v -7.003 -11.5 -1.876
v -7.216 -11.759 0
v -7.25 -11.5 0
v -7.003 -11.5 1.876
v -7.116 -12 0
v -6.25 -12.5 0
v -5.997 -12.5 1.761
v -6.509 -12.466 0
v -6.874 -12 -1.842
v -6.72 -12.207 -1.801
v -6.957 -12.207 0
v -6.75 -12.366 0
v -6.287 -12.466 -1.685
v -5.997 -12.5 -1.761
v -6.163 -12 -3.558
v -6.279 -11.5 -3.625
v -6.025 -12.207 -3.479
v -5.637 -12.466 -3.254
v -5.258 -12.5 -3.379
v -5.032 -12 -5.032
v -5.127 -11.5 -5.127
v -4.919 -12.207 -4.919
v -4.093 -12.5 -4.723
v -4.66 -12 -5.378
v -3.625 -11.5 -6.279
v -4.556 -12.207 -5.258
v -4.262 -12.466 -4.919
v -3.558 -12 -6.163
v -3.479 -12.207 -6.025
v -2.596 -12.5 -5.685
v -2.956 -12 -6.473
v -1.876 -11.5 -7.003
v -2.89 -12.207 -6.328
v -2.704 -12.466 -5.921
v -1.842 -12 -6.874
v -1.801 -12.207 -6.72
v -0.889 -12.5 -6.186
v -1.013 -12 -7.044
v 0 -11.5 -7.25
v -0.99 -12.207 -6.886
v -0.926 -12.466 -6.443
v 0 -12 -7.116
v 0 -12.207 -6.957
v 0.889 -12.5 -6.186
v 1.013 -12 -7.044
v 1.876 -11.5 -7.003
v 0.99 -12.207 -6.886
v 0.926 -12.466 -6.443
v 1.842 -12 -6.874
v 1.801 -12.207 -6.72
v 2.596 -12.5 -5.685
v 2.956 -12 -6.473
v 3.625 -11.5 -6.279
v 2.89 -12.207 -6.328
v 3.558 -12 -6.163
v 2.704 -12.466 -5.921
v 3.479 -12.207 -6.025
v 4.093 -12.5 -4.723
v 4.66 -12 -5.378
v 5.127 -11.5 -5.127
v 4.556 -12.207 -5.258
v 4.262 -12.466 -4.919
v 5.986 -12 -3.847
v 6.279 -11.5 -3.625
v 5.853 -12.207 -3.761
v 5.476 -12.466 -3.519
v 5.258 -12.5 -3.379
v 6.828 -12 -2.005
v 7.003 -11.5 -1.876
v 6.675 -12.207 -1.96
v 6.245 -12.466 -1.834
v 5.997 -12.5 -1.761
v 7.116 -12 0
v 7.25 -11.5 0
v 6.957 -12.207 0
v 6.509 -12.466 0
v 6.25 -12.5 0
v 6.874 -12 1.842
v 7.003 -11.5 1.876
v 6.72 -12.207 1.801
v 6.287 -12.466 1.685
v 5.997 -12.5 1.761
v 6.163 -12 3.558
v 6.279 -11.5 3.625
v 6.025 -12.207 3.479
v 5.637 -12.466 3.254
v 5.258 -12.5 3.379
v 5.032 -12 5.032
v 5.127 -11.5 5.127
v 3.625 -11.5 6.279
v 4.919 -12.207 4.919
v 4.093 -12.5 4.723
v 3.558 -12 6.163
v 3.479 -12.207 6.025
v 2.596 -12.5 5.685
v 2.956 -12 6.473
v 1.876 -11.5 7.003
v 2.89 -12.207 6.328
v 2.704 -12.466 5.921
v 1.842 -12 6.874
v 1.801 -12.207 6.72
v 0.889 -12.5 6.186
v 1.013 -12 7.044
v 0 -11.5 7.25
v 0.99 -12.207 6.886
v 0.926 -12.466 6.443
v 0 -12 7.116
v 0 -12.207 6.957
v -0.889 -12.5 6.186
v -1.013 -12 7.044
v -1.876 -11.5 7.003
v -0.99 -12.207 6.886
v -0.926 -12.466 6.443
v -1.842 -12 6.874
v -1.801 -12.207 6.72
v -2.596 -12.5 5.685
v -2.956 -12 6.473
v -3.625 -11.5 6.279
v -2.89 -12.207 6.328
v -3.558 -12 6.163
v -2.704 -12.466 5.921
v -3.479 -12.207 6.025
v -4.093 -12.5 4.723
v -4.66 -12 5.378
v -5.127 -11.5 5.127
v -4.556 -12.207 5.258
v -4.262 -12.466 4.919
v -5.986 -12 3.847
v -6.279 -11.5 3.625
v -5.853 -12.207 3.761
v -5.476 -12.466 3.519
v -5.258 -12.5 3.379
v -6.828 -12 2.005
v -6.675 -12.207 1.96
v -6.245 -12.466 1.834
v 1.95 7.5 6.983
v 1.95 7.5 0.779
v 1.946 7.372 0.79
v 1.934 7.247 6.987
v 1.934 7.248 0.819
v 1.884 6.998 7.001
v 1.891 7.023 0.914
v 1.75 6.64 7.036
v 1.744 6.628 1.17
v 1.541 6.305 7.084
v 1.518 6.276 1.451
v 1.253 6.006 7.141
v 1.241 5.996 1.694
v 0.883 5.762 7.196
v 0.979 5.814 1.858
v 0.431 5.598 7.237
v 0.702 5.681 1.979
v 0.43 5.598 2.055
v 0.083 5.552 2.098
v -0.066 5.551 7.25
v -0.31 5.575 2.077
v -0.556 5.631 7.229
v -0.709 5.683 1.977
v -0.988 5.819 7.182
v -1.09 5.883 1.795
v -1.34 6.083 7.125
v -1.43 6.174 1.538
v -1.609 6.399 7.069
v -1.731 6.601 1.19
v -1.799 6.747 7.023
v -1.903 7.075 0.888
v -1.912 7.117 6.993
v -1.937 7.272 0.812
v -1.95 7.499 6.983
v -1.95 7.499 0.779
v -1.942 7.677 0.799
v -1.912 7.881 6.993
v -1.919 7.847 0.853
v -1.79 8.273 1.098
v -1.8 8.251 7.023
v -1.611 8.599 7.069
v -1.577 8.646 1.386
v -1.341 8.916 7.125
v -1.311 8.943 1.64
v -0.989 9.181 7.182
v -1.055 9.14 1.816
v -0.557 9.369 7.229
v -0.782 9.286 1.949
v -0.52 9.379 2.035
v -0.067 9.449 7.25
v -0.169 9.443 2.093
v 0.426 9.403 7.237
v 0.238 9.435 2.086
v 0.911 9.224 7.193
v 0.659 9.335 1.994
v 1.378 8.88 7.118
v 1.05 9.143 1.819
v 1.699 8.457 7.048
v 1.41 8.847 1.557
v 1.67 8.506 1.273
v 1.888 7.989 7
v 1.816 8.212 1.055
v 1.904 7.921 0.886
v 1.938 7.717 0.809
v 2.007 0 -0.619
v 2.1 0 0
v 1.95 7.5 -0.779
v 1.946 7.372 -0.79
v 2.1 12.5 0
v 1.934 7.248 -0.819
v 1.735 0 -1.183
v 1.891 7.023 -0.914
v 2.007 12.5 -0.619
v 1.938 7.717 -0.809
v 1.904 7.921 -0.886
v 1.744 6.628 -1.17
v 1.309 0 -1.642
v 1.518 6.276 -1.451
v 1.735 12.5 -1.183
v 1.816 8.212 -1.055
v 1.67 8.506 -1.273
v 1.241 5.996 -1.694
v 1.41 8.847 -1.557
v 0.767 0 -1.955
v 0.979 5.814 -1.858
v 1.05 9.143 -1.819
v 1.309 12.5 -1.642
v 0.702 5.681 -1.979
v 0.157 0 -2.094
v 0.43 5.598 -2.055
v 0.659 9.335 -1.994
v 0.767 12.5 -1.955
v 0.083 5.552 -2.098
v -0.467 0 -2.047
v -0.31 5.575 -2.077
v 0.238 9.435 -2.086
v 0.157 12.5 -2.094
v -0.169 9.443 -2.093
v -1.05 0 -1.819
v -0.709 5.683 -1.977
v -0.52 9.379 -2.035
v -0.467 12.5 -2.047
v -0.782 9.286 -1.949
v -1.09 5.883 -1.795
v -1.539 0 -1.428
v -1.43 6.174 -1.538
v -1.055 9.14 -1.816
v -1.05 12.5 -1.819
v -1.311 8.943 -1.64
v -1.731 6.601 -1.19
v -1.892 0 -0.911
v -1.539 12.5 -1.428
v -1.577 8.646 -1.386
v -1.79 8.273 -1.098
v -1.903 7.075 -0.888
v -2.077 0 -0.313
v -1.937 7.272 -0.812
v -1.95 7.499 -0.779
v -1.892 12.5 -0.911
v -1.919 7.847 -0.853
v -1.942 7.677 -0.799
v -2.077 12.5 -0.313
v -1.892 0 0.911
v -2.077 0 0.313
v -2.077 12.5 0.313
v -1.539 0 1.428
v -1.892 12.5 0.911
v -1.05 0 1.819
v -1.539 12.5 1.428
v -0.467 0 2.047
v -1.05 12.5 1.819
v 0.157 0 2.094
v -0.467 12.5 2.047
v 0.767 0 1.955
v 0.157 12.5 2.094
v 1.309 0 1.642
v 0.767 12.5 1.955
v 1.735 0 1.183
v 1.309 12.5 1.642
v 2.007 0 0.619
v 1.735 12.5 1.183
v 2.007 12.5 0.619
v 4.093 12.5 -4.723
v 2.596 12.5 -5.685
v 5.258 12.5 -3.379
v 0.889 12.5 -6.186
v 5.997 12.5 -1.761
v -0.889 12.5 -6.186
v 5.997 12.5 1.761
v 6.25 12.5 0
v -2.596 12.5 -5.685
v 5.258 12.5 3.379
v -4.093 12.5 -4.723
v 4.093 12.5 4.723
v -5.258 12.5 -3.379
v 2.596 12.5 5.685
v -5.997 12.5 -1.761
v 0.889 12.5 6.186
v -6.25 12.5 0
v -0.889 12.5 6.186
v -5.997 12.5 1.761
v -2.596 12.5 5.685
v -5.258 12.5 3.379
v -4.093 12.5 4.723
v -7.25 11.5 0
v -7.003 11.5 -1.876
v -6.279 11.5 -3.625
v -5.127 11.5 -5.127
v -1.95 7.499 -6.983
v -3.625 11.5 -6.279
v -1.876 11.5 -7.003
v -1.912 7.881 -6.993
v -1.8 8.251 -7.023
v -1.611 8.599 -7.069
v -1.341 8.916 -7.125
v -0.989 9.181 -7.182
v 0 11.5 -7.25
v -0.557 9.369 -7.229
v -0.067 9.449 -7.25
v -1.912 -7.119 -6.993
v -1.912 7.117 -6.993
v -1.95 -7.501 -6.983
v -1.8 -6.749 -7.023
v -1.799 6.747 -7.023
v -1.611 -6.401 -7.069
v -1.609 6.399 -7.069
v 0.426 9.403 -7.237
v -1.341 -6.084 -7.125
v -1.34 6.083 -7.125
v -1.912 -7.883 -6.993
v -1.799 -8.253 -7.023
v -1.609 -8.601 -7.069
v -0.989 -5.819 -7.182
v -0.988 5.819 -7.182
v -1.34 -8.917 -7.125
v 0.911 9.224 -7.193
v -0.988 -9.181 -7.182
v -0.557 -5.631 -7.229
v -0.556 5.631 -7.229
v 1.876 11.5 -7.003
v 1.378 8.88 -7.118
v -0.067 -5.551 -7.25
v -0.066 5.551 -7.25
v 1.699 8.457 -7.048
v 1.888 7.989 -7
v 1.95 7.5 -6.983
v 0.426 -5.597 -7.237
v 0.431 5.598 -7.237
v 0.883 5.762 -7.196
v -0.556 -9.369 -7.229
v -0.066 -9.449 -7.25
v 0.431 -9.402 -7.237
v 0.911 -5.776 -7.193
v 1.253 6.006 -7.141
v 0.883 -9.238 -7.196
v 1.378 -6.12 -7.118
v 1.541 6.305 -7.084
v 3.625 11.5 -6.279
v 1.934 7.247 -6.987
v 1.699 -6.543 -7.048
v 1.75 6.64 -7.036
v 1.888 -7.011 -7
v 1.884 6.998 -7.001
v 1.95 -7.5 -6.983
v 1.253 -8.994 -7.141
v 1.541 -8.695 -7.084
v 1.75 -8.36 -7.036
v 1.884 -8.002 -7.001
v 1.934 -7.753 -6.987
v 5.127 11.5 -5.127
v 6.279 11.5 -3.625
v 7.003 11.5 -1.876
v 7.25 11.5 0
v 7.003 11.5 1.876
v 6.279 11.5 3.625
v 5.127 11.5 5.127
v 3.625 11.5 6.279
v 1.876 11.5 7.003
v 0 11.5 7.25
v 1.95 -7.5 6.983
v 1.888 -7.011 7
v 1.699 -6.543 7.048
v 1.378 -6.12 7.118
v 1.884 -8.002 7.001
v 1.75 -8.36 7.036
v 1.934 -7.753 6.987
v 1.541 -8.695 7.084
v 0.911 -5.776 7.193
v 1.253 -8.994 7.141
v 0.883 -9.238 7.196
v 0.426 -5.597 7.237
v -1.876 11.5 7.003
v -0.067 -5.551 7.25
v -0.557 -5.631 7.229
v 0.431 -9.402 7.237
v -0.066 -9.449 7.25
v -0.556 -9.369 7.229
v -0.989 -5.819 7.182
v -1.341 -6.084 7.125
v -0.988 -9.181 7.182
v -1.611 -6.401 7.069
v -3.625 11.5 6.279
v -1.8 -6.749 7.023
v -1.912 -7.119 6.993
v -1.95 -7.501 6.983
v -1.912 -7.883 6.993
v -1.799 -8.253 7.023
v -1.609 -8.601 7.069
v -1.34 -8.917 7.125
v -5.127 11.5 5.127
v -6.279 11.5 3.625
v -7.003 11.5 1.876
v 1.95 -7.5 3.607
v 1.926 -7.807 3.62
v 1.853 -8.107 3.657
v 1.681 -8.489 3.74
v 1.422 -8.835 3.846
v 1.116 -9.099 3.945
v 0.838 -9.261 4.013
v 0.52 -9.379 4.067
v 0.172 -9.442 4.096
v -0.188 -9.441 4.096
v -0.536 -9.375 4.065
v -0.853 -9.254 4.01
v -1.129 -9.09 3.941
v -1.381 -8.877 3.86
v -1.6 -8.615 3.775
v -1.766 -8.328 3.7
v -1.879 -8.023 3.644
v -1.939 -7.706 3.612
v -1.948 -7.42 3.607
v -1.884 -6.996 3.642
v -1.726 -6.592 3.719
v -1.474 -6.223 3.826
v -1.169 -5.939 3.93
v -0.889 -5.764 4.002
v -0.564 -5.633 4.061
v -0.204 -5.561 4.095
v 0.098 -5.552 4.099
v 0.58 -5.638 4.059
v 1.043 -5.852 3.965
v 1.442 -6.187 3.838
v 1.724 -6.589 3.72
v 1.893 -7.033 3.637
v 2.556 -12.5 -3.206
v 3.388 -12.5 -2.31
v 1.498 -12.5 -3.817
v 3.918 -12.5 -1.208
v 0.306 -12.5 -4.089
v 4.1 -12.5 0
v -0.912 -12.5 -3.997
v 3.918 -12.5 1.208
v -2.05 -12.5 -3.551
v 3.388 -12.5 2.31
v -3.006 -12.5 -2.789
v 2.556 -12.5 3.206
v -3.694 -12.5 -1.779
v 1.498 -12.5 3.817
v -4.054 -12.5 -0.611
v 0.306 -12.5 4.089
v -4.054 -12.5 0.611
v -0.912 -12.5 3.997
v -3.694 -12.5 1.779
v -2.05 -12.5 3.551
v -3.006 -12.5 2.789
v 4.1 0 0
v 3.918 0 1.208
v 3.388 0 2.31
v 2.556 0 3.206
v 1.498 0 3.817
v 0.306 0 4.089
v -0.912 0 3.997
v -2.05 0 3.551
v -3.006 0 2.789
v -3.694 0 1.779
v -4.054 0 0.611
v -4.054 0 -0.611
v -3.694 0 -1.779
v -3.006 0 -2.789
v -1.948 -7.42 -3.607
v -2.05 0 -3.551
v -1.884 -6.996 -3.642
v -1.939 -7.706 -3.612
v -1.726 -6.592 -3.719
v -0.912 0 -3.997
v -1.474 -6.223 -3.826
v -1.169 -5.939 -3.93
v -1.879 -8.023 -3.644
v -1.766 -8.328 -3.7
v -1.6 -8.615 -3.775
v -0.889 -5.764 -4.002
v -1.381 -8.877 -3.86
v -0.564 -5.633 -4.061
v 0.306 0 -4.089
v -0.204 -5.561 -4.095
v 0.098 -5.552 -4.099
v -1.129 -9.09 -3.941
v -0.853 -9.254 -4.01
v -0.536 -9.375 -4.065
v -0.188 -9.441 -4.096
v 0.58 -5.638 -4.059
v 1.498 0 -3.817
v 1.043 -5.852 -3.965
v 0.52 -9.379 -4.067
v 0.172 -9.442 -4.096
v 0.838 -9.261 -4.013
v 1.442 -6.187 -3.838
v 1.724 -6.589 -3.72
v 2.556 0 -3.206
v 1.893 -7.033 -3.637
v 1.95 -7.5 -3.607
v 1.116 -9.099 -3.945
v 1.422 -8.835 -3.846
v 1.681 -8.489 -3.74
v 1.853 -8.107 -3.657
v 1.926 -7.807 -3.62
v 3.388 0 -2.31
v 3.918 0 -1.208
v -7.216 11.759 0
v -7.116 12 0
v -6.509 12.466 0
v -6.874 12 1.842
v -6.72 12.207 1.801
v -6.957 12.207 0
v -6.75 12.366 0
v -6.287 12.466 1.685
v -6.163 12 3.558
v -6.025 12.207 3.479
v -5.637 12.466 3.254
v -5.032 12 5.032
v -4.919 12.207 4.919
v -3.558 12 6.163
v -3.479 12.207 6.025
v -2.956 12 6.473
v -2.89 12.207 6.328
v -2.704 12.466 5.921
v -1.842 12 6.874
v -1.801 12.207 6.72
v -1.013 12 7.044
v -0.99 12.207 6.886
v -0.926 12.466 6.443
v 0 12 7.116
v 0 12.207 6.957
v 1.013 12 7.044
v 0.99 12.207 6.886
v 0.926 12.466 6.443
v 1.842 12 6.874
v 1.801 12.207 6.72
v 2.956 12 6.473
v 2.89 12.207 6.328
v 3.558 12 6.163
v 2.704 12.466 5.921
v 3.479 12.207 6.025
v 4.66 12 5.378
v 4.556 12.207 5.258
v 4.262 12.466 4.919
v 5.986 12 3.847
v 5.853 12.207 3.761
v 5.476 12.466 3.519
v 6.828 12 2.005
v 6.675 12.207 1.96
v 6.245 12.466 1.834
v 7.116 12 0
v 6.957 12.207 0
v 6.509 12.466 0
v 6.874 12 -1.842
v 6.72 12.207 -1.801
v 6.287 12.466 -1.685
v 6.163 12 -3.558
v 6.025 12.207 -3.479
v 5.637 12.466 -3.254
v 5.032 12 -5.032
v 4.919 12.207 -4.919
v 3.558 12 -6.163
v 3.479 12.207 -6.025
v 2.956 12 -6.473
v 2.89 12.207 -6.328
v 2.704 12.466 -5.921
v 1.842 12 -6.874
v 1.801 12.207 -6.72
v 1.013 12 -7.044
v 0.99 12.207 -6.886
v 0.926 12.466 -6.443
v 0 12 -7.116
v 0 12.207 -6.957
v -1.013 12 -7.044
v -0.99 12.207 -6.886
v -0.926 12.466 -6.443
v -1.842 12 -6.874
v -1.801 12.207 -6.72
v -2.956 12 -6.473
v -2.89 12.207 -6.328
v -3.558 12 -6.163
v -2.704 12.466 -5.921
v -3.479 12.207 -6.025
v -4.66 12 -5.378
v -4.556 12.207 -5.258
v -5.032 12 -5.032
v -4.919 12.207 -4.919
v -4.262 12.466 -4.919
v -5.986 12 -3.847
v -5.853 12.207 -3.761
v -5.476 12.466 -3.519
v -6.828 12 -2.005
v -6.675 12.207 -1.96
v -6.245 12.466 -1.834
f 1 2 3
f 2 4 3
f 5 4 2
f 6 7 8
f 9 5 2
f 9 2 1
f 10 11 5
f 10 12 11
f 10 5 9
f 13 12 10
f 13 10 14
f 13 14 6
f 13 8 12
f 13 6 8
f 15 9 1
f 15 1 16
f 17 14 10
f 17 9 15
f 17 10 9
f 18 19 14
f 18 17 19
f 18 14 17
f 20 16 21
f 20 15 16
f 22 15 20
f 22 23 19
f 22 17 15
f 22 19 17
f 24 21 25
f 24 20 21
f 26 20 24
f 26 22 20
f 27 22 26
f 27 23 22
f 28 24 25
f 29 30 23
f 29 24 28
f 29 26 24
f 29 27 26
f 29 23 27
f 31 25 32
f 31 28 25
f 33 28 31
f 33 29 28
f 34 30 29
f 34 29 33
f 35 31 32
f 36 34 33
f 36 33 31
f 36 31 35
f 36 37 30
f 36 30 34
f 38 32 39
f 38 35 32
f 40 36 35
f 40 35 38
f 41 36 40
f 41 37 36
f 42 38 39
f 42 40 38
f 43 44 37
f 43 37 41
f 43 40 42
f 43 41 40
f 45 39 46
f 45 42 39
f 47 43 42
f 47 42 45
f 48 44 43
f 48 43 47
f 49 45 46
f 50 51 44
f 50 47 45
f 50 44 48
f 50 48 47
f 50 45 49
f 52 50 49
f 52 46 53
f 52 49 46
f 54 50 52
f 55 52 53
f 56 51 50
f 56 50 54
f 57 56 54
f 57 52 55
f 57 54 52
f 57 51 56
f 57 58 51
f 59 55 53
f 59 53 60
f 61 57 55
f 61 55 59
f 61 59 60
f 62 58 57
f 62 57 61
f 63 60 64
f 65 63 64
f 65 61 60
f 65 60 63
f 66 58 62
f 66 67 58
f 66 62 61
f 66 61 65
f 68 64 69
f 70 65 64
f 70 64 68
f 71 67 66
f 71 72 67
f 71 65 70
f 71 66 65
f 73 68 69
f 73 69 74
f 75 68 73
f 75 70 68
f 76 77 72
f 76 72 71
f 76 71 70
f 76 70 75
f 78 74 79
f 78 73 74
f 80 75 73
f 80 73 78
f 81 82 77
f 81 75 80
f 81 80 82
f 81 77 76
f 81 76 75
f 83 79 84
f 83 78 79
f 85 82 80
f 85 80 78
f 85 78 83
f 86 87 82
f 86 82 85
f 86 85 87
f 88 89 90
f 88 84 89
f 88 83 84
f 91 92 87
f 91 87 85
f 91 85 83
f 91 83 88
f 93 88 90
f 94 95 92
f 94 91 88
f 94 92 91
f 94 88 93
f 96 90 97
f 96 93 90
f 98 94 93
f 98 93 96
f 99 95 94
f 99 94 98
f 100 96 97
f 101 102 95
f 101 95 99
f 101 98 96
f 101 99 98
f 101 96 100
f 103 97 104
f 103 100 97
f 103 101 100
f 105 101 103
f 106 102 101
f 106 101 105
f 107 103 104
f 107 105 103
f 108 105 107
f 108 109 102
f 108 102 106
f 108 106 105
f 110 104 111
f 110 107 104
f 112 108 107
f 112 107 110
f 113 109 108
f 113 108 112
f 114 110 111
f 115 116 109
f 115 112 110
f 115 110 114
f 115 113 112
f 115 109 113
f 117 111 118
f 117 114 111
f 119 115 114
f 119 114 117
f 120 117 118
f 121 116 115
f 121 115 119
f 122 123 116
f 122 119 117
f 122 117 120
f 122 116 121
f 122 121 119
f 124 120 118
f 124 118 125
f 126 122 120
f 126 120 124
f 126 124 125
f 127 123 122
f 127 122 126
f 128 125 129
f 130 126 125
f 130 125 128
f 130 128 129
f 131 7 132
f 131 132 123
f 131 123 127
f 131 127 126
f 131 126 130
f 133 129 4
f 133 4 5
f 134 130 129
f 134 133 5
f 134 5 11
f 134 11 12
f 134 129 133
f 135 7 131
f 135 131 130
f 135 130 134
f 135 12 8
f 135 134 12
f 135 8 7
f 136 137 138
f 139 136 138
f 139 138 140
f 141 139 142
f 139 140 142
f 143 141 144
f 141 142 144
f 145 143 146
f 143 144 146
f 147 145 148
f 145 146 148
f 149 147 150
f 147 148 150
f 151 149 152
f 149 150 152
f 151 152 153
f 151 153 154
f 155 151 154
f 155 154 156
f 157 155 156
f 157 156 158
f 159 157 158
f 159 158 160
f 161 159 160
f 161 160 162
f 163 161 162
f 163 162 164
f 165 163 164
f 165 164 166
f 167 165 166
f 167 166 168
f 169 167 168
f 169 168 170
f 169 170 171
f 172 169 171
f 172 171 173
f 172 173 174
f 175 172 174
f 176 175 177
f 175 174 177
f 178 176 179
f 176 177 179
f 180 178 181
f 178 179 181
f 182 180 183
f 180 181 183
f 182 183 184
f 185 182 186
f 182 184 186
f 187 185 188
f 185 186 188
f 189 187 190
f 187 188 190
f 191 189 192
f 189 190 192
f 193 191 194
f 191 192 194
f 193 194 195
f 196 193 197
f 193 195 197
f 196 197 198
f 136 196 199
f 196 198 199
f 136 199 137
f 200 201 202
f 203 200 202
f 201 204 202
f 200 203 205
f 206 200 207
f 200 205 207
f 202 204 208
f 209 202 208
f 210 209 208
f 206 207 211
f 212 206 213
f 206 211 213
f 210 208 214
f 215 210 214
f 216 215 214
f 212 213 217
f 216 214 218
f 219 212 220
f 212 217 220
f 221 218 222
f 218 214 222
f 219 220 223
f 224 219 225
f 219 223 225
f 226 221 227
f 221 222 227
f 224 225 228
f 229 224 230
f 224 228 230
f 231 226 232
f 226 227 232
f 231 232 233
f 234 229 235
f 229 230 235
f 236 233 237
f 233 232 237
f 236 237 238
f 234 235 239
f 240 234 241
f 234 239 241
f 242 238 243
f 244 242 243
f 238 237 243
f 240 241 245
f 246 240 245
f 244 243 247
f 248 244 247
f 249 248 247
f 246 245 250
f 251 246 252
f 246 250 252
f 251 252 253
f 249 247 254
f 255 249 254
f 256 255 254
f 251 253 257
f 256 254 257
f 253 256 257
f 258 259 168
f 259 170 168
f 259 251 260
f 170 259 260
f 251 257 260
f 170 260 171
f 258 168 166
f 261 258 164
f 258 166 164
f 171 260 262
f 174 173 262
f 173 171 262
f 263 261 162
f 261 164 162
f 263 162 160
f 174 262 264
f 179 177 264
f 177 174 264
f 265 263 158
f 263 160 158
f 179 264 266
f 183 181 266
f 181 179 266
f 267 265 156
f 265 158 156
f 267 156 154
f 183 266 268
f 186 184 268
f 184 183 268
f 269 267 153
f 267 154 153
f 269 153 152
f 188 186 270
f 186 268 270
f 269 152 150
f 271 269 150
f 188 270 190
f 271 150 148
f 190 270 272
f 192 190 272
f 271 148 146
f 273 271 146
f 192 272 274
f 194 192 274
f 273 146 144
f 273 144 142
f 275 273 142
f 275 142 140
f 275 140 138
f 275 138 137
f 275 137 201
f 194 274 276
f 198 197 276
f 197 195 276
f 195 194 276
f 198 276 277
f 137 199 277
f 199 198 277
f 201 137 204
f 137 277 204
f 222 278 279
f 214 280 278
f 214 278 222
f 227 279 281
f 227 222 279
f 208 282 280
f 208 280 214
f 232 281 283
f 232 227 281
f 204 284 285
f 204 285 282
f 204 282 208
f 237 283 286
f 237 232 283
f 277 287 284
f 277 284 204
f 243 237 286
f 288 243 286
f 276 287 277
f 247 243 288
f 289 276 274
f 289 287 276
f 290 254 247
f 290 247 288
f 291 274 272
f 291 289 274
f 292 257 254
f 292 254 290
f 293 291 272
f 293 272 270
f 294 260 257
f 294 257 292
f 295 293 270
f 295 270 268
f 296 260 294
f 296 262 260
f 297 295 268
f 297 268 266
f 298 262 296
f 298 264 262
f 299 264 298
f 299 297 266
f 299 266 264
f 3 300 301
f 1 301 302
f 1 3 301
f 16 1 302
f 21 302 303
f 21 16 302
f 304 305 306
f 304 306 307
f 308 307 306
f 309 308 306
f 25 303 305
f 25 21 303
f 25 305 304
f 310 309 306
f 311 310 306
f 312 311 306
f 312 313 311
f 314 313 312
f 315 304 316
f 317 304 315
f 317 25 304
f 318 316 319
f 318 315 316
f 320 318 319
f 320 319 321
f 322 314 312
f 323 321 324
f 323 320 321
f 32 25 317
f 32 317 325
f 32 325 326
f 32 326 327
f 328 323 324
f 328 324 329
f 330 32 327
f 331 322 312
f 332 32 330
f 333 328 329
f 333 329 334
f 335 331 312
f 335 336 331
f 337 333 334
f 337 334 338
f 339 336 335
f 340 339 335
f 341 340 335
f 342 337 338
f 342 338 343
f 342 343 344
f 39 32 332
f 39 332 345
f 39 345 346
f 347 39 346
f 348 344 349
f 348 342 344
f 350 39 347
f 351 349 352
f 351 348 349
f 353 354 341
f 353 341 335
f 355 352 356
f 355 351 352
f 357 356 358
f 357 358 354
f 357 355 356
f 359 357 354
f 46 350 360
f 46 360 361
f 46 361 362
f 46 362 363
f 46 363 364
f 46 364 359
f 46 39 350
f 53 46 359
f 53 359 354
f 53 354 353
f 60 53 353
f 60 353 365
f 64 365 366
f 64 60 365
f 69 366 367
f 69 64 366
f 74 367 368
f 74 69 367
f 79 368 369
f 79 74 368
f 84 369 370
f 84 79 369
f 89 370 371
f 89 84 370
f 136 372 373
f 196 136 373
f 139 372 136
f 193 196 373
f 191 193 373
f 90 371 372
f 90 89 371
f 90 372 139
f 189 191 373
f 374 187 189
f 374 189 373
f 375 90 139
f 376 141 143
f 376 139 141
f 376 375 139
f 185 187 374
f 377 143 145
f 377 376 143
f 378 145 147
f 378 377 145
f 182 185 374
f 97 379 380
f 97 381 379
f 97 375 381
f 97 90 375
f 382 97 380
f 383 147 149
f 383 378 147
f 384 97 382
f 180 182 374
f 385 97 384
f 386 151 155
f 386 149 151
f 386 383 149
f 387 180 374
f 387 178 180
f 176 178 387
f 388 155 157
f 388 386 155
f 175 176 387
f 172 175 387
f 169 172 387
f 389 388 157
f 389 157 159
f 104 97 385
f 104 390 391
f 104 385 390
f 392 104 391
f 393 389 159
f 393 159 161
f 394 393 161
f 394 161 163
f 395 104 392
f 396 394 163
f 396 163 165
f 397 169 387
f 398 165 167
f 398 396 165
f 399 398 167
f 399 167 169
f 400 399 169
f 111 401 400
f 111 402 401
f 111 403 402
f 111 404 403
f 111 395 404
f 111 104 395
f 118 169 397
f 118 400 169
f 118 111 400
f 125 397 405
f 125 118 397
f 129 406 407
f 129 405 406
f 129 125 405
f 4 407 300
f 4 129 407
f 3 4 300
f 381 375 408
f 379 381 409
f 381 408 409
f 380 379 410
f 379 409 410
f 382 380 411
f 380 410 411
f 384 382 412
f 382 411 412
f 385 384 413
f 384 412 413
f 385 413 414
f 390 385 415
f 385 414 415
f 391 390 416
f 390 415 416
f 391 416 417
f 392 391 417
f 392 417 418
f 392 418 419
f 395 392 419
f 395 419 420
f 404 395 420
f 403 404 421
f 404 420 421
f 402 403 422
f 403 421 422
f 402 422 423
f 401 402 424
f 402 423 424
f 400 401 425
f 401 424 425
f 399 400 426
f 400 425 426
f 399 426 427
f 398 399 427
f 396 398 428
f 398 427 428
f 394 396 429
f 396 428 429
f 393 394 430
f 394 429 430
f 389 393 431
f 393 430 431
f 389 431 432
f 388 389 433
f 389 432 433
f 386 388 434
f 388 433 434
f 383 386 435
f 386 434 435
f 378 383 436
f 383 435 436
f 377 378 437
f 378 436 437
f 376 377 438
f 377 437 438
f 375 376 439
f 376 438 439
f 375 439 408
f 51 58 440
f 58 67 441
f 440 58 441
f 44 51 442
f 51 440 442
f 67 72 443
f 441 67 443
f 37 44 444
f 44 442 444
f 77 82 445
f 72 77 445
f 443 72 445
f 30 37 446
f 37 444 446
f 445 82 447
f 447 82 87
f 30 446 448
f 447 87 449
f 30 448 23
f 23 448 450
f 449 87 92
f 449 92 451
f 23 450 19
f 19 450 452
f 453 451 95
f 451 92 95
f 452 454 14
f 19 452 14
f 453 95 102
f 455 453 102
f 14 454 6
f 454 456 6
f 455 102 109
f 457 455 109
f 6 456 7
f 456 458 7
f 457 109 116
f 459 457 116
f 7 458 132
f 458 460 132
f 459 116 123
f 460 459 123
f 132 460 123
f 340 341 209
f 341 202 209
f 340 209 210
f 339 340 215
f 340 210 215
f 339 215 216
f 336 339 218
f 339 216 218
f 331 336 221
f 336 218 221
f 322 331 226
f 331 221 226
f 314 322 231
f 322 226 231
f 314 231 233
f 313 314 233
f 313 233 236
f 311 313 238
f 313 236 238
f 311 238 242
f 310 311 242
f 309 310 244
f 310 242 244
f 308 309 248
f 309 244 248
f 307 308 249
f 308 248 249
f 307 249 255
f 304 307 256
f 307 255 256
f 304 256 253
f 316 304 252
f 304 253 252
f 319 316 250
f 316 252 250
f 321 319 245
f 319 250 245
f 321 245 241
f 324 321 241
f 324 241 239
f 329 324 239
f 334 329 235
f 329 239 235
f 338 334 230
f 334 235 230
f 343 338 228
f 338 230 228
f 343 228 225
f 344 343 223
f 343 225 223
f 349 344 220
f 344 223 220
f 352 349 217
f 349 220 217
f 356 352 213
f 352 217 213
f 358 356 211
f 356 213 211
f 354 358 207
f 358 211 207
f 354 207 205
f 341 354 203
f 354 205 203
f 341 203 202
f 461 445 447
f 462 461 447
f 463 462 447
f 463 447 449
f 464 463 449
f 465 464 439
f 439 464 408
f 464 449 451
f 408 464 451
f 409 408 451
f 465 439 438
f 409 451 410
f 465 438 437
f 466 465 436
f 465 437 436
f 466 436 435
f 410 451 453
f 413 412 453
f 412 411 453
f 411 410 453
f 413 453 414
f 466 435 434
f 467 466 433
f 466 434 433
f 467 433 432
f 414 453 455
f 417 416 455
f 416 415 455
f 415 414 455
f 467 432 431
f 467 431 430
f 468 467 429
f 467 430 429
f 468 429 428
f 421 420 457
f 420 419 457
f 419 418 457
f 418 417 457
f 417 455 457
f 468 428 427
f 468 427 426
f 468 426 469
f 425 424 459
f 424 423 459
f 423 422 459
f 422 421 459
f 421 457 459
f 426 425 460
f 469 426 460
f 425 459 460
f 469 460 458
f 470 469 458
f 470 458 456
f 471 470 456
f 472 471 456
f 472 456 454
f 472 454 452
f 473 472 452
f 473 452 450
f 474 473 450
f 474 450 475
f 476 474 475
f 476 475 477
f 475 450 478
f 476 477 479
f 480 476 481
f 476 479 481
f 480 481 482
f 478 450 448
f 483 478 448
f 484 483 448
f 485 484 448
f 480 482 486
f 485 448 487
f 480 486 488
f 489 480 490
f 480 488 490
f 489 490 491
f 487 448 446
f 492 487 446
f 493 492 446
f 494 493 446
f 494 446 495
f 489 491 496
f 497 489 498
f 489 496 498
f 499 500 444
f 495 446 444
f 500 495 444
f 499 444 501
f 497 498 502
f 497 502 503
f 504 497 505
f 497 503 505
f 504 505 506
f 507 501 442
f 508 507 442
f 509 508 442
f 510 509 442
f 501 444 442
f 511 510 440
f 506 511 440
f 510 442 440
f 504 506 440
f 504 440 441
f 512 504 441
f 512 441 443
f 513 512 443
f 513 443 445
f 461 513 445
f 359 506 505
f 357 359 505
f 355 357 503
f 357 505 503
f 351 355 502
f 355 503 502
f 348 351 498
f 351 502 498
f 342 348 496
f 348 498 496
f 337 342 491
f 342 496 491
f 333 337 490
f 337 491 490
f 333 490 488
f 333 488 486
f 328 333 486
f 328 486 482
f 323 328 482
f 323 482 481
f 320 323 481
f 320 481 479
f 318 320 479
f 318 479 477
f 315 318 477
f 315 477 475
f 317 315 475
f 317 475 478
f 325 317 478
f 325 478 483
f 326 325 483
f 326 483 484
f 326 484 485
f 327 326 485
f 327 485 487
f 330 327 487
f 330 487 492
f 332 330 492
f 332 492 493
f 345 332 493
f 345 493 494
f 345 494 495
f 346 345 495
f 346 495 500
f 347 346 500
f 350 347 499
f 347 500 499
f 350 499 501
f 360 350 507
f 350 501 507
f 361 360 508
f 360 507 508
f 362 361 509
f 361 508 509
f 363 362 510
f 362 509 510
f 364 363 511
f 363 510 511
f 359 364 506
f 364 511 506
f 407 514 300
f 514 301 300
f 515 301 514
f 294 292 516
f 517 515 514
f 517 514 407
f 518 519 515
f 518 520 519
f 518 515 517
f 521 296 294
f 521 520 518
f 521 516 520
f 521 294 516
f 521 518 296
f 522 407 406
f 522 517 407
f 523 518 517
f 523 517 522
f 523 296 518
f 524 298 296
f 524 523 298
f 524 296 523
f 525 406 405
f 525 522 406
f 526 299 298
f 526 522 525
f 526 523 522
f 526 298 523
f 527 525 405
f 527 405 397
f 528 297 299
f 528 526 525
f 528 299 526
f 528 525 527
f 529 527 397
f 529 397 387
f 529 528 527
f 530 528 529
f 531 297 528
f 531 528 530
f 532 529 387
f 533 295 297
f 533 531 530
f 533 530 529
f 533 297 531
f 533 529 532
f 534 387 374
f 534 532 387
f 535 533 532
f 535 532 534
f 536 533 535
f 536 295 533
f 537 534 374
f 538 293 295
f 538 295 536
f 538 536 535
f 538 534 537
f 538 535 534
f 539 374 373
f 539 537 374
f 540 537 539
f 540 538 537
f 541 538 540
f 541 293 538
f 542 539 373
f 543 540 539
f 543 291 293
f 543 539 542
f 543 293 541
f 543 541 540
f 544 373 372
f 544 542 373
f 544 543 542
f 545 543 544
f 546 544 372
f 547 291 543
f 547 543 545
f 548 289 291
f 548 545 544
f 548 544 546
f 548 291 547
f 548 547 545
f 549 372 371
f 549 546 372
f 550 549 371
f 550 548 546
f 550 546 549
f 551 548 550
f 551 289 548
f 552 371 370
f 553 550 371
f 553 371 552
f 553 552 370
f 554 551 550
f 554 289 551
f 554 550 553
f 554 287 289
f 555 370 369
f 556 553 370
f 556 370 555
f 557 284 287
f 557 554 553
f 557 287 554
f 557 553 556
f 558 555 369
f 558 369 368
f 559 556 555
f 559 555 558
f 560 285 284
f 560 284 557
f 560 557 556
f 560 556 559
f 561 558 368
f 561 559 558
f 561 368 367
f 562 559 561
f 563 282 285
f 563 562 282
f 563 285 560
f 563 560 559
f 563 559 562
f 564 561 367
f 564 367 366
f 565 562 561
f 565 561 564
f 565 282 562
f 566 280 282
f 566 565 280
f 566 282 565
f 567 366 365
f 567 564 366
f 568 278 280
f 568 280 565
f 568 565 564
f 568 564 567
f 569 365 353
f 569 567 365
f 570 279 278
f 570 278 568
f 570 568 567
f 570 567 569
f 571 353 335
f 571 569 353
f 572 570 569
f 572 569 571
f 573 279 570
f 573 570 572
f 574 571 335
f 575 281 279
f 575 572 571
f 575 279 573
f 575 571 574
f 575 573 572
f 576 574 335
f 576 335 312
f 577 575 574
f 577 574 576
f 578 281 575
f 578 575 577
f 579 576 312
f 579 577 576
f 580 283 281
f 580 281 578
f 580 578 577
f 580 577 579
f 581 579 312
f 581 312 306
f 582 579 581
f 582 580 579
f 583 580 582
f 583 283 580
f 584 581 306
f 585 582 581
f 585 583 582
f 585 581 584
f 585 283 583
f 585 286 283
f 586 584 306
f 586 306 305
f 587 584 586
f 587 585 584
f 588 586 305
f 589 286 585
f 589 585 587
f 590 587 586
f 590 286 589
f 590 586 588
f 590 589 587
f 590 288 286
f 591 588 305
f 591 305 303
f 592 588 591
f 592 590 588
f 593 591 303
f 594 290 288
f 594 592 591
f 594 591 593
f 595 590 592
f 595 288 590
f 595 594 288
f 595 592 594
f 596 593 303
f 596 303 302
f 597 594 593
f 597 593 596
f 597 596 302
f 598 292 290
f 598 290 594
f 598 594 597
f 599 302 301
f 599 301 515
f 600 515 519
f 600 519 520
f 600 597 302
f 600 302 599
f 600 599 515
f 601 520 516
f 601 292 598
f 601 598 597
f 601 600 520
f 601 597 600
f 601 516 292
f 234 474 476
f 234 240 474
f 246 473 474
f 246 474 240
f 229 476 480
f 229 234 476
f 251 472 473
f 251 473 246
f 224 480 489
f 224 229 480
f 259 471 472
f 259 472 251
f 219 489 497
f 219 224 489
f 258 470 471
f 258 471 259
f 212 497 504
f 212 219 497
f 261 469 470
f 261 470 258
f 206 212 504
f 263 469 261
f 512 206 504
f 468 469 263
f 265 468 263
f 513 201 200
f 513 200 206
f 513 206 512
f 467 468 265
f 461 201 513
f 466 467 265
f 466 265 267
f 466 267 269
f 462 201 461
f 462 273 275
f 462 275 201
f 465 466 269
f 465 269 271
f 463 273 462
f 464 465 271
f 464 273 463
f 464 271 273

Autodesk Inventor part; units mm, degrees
sketch "Эскиз1" plane through (0, 0, 0) normal (0, 1, 0) x (-1, 0, 0)
  circle A0 centre (0, 0) radius 7.25
  dimension "d0" = 14.5
extrude "Выдавливание1" add sketch "Эскиз1" along normal mid plane 25
sketch "Эскиз2" plane through (0, 12.5, 0) normal (0, 1, 0) x (1, 0, 0)
  circle A0 centre (0, 0) radius 2.1
  dimension "d3" = 4.2
extrude "Выдавливание2" cut sketch "Эскиз2" against normal up to surface (12.5 mm away)
sketch "Эскиз3" plane through (0, -12.5, 0) normal (0, -1, 0) x (1, 0, 0)
  circle A0 centre (0, 0) radius 4.1
  dimension "d6" = 8.2
extrude "Выдавливание3" cut sketch "Эскиз3" against normal up to surface (12.5 mm away)
sketch "Эскиз4" plane through (0, 0, 0) normal (0, 0, 1) x (1, 0, 0)
  circle A0 centre (0, 7.5) radius 1.95
  circle A1 centre (0, -7.5) radius 1.95
  line L0 (0, 17.5) -> (0, -17.5) construction
  line L1 (-2.1, 12.5) -> (2.1, 12.5) projected
  line L2 (4.1, -12.5) -> (-4.1, -12.5) projected
  point P0 (0, 0)
  dimension "d9" = 5
  dimension "d10" = 5
  dimension "d11" = 3.9
extrude "Выдавливание4" cut sketch "Эскиз4" along normal mid plane 20
fillet "Сопряжение1" radius 1 2 edges at (7.25, -12.5, 0) (7.25, 12.5, 0)
properties part number "фтулка"
